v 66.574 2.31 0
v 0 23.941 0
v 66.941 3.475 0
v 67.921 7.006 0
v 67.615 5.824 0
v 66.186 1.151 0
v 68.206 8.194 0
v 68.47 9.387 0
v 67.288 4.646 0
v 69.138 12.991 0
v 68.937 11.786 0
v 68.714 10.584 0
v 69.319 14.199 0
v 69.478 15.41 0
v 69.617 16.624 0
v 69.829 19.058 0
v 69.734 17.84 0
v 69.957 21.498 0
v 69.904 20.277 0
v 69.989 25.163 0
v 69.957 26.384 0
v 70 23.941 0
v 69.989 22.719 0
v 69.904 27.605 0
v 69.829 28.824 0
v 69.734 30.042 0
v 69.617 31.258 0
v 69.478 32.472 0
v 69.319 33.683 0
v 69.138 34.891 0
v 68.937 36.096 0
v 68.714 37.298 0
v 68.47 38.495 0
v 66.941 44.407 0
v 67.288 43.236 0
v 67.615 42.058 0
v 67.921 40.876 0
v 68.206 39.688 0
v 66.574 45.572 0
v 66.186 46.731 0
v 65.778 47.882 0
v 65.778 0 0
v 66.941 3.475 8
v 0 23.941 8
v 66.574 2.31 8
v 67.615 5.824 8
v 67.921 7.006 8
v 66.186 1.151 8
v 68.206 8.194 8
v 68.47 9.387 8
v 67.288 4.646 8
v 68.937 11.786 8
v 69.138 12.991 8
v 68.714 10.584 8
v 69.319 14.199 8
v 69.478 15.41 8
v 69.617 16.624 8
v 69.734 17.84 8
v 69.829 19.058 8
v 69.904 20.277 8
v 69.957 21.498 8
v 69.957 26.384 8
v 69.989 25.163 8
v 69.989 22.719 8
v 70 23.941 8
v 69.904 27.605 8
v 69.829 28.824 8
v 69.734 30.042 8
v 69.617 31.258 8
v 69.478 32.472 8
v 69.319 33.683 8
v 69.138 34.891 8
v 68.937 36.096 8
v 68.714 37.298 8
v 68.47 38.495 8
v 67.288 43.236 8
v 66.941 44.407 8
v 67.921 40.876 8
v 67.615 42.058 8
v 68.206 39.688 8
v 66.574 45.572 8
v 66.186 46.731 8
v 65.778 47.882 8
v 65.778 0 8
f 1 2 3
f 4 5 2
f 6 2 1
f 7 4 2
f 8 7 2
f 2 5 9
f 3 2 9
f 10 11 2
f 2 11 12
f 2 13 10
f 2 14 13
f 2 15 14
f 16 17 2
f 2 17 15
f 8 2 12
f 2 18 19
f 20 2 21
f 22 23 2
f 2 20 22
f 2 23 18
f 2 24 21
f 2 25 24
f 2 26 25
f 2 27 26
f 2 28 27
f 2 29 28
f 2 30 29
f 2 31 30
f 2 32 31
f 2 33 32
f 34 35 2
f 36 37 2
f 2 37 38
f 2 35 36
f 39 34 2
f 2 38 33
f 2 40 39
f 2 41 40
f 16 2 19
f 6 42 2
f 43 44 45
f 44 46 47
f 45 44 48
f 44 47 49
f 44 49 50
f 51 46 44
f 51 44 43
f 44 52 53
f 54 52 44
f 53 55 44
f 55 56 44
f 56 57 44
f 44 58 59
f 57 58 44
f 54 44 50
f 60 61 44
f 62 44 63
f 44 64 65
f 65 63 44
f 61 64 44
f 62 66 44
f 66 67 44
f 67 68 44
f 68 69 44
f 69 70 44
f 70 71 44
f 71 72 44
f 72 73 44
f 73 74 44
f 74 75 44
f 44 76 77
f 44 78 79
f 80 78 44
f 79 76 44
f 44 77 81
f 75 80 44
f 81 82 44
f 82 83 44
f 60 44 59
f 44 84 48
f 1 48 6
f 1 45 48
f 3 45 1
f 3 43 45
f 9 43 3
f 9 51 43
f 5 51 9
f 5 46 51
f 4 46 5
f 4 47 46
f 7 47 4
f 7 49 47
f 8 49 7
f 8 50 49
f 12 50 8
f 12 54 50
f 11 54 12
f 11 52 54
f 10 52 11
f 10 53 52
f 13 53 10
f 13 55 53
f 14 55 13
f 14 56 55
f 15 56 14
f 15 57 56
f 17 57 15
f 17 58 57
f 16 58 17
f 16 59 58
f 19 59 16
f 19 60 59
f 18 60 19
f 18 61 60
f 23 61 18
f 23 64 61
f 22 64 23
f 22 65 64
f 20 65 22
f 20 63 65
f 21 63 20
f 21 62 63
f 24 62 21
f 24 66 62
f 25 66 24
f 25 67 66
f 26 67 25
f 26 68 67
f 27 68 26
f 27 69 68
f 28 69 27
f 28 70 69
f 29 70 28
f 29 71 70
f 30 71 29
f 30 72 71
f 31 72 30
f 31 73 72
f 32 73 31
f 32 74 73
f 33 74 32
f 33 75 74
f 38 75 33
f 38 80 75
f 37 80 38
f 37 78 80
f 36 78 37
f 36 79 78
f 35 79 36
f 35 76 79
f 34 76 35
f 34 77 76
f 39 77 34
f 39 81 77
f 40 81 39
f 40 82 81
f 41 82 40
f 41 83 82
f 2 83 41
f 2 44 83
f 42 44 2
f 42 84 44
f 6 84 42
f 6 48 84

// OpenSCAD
$fn = 32;

// ----------------------------------------------------------------------
// Arc profile plate: sector, 42 points
// ----------------------------------------------------------------------

// --- parameters (mm) ---
sector_angle = 40;        // sector angle, degrees
sector_r = 70;            // outer radius
arc_step = 1;             // sampling step of the arc, degrees
plate_t = 8;              // plate thickness, Z
fit_tol = 0.02;           // declared fit tolerance (prompt contract)
free_tol = 0.2;           // declared free tolerance (prompt contract)

bbox_x = 2 * sector_r * sin(sector_angle / 2);  // chord of the sector
bbox_y = sector_r;  // depth of the sector (apex to arc)

profile = [[65.778, 0], [66.186, 1.151], [66.574, 2.31], [66.941, 3.475], [67.288, 4.646], [67.615, 5.824], [67.921, 7.006], [68.206, 8.194], [68.47, 9.387], [68.714, 10.584], [68.937, 11.786], [69.138, 12.991], [69.319, 14.199], [69.478, 15.41], [69.617, 16.624], [69.734, 17.84], [69.829, 19.058], [69.904, 20.277], [69.957, 21.498], [69.989, 22.719], [70, 23.941], [69.989, 25.163], [69.957, 26.384], [69.904, 27.605], [69.829, 28.824], [69.734, 30.042], [69.617, 31.258], [69.478, 32.472], [69.319, 33.683], [69.138, 34.891], [68.937, 36.096], [68.714, 37.298], [68.47, 38.495], [68.206, 39.688], [67.921, 40.876], [67.615, 42.058], [67.288, 43.236], [66.941, 44.407], [66.574, 45.572], [66.186, 46.731], [65.778, 47.882], [0, 23.941]];  // primary outline, 42 points, counter clockwise

// --- the one profile operation ---
linear_extrude(height = plate_t) polygon(points = profile);
